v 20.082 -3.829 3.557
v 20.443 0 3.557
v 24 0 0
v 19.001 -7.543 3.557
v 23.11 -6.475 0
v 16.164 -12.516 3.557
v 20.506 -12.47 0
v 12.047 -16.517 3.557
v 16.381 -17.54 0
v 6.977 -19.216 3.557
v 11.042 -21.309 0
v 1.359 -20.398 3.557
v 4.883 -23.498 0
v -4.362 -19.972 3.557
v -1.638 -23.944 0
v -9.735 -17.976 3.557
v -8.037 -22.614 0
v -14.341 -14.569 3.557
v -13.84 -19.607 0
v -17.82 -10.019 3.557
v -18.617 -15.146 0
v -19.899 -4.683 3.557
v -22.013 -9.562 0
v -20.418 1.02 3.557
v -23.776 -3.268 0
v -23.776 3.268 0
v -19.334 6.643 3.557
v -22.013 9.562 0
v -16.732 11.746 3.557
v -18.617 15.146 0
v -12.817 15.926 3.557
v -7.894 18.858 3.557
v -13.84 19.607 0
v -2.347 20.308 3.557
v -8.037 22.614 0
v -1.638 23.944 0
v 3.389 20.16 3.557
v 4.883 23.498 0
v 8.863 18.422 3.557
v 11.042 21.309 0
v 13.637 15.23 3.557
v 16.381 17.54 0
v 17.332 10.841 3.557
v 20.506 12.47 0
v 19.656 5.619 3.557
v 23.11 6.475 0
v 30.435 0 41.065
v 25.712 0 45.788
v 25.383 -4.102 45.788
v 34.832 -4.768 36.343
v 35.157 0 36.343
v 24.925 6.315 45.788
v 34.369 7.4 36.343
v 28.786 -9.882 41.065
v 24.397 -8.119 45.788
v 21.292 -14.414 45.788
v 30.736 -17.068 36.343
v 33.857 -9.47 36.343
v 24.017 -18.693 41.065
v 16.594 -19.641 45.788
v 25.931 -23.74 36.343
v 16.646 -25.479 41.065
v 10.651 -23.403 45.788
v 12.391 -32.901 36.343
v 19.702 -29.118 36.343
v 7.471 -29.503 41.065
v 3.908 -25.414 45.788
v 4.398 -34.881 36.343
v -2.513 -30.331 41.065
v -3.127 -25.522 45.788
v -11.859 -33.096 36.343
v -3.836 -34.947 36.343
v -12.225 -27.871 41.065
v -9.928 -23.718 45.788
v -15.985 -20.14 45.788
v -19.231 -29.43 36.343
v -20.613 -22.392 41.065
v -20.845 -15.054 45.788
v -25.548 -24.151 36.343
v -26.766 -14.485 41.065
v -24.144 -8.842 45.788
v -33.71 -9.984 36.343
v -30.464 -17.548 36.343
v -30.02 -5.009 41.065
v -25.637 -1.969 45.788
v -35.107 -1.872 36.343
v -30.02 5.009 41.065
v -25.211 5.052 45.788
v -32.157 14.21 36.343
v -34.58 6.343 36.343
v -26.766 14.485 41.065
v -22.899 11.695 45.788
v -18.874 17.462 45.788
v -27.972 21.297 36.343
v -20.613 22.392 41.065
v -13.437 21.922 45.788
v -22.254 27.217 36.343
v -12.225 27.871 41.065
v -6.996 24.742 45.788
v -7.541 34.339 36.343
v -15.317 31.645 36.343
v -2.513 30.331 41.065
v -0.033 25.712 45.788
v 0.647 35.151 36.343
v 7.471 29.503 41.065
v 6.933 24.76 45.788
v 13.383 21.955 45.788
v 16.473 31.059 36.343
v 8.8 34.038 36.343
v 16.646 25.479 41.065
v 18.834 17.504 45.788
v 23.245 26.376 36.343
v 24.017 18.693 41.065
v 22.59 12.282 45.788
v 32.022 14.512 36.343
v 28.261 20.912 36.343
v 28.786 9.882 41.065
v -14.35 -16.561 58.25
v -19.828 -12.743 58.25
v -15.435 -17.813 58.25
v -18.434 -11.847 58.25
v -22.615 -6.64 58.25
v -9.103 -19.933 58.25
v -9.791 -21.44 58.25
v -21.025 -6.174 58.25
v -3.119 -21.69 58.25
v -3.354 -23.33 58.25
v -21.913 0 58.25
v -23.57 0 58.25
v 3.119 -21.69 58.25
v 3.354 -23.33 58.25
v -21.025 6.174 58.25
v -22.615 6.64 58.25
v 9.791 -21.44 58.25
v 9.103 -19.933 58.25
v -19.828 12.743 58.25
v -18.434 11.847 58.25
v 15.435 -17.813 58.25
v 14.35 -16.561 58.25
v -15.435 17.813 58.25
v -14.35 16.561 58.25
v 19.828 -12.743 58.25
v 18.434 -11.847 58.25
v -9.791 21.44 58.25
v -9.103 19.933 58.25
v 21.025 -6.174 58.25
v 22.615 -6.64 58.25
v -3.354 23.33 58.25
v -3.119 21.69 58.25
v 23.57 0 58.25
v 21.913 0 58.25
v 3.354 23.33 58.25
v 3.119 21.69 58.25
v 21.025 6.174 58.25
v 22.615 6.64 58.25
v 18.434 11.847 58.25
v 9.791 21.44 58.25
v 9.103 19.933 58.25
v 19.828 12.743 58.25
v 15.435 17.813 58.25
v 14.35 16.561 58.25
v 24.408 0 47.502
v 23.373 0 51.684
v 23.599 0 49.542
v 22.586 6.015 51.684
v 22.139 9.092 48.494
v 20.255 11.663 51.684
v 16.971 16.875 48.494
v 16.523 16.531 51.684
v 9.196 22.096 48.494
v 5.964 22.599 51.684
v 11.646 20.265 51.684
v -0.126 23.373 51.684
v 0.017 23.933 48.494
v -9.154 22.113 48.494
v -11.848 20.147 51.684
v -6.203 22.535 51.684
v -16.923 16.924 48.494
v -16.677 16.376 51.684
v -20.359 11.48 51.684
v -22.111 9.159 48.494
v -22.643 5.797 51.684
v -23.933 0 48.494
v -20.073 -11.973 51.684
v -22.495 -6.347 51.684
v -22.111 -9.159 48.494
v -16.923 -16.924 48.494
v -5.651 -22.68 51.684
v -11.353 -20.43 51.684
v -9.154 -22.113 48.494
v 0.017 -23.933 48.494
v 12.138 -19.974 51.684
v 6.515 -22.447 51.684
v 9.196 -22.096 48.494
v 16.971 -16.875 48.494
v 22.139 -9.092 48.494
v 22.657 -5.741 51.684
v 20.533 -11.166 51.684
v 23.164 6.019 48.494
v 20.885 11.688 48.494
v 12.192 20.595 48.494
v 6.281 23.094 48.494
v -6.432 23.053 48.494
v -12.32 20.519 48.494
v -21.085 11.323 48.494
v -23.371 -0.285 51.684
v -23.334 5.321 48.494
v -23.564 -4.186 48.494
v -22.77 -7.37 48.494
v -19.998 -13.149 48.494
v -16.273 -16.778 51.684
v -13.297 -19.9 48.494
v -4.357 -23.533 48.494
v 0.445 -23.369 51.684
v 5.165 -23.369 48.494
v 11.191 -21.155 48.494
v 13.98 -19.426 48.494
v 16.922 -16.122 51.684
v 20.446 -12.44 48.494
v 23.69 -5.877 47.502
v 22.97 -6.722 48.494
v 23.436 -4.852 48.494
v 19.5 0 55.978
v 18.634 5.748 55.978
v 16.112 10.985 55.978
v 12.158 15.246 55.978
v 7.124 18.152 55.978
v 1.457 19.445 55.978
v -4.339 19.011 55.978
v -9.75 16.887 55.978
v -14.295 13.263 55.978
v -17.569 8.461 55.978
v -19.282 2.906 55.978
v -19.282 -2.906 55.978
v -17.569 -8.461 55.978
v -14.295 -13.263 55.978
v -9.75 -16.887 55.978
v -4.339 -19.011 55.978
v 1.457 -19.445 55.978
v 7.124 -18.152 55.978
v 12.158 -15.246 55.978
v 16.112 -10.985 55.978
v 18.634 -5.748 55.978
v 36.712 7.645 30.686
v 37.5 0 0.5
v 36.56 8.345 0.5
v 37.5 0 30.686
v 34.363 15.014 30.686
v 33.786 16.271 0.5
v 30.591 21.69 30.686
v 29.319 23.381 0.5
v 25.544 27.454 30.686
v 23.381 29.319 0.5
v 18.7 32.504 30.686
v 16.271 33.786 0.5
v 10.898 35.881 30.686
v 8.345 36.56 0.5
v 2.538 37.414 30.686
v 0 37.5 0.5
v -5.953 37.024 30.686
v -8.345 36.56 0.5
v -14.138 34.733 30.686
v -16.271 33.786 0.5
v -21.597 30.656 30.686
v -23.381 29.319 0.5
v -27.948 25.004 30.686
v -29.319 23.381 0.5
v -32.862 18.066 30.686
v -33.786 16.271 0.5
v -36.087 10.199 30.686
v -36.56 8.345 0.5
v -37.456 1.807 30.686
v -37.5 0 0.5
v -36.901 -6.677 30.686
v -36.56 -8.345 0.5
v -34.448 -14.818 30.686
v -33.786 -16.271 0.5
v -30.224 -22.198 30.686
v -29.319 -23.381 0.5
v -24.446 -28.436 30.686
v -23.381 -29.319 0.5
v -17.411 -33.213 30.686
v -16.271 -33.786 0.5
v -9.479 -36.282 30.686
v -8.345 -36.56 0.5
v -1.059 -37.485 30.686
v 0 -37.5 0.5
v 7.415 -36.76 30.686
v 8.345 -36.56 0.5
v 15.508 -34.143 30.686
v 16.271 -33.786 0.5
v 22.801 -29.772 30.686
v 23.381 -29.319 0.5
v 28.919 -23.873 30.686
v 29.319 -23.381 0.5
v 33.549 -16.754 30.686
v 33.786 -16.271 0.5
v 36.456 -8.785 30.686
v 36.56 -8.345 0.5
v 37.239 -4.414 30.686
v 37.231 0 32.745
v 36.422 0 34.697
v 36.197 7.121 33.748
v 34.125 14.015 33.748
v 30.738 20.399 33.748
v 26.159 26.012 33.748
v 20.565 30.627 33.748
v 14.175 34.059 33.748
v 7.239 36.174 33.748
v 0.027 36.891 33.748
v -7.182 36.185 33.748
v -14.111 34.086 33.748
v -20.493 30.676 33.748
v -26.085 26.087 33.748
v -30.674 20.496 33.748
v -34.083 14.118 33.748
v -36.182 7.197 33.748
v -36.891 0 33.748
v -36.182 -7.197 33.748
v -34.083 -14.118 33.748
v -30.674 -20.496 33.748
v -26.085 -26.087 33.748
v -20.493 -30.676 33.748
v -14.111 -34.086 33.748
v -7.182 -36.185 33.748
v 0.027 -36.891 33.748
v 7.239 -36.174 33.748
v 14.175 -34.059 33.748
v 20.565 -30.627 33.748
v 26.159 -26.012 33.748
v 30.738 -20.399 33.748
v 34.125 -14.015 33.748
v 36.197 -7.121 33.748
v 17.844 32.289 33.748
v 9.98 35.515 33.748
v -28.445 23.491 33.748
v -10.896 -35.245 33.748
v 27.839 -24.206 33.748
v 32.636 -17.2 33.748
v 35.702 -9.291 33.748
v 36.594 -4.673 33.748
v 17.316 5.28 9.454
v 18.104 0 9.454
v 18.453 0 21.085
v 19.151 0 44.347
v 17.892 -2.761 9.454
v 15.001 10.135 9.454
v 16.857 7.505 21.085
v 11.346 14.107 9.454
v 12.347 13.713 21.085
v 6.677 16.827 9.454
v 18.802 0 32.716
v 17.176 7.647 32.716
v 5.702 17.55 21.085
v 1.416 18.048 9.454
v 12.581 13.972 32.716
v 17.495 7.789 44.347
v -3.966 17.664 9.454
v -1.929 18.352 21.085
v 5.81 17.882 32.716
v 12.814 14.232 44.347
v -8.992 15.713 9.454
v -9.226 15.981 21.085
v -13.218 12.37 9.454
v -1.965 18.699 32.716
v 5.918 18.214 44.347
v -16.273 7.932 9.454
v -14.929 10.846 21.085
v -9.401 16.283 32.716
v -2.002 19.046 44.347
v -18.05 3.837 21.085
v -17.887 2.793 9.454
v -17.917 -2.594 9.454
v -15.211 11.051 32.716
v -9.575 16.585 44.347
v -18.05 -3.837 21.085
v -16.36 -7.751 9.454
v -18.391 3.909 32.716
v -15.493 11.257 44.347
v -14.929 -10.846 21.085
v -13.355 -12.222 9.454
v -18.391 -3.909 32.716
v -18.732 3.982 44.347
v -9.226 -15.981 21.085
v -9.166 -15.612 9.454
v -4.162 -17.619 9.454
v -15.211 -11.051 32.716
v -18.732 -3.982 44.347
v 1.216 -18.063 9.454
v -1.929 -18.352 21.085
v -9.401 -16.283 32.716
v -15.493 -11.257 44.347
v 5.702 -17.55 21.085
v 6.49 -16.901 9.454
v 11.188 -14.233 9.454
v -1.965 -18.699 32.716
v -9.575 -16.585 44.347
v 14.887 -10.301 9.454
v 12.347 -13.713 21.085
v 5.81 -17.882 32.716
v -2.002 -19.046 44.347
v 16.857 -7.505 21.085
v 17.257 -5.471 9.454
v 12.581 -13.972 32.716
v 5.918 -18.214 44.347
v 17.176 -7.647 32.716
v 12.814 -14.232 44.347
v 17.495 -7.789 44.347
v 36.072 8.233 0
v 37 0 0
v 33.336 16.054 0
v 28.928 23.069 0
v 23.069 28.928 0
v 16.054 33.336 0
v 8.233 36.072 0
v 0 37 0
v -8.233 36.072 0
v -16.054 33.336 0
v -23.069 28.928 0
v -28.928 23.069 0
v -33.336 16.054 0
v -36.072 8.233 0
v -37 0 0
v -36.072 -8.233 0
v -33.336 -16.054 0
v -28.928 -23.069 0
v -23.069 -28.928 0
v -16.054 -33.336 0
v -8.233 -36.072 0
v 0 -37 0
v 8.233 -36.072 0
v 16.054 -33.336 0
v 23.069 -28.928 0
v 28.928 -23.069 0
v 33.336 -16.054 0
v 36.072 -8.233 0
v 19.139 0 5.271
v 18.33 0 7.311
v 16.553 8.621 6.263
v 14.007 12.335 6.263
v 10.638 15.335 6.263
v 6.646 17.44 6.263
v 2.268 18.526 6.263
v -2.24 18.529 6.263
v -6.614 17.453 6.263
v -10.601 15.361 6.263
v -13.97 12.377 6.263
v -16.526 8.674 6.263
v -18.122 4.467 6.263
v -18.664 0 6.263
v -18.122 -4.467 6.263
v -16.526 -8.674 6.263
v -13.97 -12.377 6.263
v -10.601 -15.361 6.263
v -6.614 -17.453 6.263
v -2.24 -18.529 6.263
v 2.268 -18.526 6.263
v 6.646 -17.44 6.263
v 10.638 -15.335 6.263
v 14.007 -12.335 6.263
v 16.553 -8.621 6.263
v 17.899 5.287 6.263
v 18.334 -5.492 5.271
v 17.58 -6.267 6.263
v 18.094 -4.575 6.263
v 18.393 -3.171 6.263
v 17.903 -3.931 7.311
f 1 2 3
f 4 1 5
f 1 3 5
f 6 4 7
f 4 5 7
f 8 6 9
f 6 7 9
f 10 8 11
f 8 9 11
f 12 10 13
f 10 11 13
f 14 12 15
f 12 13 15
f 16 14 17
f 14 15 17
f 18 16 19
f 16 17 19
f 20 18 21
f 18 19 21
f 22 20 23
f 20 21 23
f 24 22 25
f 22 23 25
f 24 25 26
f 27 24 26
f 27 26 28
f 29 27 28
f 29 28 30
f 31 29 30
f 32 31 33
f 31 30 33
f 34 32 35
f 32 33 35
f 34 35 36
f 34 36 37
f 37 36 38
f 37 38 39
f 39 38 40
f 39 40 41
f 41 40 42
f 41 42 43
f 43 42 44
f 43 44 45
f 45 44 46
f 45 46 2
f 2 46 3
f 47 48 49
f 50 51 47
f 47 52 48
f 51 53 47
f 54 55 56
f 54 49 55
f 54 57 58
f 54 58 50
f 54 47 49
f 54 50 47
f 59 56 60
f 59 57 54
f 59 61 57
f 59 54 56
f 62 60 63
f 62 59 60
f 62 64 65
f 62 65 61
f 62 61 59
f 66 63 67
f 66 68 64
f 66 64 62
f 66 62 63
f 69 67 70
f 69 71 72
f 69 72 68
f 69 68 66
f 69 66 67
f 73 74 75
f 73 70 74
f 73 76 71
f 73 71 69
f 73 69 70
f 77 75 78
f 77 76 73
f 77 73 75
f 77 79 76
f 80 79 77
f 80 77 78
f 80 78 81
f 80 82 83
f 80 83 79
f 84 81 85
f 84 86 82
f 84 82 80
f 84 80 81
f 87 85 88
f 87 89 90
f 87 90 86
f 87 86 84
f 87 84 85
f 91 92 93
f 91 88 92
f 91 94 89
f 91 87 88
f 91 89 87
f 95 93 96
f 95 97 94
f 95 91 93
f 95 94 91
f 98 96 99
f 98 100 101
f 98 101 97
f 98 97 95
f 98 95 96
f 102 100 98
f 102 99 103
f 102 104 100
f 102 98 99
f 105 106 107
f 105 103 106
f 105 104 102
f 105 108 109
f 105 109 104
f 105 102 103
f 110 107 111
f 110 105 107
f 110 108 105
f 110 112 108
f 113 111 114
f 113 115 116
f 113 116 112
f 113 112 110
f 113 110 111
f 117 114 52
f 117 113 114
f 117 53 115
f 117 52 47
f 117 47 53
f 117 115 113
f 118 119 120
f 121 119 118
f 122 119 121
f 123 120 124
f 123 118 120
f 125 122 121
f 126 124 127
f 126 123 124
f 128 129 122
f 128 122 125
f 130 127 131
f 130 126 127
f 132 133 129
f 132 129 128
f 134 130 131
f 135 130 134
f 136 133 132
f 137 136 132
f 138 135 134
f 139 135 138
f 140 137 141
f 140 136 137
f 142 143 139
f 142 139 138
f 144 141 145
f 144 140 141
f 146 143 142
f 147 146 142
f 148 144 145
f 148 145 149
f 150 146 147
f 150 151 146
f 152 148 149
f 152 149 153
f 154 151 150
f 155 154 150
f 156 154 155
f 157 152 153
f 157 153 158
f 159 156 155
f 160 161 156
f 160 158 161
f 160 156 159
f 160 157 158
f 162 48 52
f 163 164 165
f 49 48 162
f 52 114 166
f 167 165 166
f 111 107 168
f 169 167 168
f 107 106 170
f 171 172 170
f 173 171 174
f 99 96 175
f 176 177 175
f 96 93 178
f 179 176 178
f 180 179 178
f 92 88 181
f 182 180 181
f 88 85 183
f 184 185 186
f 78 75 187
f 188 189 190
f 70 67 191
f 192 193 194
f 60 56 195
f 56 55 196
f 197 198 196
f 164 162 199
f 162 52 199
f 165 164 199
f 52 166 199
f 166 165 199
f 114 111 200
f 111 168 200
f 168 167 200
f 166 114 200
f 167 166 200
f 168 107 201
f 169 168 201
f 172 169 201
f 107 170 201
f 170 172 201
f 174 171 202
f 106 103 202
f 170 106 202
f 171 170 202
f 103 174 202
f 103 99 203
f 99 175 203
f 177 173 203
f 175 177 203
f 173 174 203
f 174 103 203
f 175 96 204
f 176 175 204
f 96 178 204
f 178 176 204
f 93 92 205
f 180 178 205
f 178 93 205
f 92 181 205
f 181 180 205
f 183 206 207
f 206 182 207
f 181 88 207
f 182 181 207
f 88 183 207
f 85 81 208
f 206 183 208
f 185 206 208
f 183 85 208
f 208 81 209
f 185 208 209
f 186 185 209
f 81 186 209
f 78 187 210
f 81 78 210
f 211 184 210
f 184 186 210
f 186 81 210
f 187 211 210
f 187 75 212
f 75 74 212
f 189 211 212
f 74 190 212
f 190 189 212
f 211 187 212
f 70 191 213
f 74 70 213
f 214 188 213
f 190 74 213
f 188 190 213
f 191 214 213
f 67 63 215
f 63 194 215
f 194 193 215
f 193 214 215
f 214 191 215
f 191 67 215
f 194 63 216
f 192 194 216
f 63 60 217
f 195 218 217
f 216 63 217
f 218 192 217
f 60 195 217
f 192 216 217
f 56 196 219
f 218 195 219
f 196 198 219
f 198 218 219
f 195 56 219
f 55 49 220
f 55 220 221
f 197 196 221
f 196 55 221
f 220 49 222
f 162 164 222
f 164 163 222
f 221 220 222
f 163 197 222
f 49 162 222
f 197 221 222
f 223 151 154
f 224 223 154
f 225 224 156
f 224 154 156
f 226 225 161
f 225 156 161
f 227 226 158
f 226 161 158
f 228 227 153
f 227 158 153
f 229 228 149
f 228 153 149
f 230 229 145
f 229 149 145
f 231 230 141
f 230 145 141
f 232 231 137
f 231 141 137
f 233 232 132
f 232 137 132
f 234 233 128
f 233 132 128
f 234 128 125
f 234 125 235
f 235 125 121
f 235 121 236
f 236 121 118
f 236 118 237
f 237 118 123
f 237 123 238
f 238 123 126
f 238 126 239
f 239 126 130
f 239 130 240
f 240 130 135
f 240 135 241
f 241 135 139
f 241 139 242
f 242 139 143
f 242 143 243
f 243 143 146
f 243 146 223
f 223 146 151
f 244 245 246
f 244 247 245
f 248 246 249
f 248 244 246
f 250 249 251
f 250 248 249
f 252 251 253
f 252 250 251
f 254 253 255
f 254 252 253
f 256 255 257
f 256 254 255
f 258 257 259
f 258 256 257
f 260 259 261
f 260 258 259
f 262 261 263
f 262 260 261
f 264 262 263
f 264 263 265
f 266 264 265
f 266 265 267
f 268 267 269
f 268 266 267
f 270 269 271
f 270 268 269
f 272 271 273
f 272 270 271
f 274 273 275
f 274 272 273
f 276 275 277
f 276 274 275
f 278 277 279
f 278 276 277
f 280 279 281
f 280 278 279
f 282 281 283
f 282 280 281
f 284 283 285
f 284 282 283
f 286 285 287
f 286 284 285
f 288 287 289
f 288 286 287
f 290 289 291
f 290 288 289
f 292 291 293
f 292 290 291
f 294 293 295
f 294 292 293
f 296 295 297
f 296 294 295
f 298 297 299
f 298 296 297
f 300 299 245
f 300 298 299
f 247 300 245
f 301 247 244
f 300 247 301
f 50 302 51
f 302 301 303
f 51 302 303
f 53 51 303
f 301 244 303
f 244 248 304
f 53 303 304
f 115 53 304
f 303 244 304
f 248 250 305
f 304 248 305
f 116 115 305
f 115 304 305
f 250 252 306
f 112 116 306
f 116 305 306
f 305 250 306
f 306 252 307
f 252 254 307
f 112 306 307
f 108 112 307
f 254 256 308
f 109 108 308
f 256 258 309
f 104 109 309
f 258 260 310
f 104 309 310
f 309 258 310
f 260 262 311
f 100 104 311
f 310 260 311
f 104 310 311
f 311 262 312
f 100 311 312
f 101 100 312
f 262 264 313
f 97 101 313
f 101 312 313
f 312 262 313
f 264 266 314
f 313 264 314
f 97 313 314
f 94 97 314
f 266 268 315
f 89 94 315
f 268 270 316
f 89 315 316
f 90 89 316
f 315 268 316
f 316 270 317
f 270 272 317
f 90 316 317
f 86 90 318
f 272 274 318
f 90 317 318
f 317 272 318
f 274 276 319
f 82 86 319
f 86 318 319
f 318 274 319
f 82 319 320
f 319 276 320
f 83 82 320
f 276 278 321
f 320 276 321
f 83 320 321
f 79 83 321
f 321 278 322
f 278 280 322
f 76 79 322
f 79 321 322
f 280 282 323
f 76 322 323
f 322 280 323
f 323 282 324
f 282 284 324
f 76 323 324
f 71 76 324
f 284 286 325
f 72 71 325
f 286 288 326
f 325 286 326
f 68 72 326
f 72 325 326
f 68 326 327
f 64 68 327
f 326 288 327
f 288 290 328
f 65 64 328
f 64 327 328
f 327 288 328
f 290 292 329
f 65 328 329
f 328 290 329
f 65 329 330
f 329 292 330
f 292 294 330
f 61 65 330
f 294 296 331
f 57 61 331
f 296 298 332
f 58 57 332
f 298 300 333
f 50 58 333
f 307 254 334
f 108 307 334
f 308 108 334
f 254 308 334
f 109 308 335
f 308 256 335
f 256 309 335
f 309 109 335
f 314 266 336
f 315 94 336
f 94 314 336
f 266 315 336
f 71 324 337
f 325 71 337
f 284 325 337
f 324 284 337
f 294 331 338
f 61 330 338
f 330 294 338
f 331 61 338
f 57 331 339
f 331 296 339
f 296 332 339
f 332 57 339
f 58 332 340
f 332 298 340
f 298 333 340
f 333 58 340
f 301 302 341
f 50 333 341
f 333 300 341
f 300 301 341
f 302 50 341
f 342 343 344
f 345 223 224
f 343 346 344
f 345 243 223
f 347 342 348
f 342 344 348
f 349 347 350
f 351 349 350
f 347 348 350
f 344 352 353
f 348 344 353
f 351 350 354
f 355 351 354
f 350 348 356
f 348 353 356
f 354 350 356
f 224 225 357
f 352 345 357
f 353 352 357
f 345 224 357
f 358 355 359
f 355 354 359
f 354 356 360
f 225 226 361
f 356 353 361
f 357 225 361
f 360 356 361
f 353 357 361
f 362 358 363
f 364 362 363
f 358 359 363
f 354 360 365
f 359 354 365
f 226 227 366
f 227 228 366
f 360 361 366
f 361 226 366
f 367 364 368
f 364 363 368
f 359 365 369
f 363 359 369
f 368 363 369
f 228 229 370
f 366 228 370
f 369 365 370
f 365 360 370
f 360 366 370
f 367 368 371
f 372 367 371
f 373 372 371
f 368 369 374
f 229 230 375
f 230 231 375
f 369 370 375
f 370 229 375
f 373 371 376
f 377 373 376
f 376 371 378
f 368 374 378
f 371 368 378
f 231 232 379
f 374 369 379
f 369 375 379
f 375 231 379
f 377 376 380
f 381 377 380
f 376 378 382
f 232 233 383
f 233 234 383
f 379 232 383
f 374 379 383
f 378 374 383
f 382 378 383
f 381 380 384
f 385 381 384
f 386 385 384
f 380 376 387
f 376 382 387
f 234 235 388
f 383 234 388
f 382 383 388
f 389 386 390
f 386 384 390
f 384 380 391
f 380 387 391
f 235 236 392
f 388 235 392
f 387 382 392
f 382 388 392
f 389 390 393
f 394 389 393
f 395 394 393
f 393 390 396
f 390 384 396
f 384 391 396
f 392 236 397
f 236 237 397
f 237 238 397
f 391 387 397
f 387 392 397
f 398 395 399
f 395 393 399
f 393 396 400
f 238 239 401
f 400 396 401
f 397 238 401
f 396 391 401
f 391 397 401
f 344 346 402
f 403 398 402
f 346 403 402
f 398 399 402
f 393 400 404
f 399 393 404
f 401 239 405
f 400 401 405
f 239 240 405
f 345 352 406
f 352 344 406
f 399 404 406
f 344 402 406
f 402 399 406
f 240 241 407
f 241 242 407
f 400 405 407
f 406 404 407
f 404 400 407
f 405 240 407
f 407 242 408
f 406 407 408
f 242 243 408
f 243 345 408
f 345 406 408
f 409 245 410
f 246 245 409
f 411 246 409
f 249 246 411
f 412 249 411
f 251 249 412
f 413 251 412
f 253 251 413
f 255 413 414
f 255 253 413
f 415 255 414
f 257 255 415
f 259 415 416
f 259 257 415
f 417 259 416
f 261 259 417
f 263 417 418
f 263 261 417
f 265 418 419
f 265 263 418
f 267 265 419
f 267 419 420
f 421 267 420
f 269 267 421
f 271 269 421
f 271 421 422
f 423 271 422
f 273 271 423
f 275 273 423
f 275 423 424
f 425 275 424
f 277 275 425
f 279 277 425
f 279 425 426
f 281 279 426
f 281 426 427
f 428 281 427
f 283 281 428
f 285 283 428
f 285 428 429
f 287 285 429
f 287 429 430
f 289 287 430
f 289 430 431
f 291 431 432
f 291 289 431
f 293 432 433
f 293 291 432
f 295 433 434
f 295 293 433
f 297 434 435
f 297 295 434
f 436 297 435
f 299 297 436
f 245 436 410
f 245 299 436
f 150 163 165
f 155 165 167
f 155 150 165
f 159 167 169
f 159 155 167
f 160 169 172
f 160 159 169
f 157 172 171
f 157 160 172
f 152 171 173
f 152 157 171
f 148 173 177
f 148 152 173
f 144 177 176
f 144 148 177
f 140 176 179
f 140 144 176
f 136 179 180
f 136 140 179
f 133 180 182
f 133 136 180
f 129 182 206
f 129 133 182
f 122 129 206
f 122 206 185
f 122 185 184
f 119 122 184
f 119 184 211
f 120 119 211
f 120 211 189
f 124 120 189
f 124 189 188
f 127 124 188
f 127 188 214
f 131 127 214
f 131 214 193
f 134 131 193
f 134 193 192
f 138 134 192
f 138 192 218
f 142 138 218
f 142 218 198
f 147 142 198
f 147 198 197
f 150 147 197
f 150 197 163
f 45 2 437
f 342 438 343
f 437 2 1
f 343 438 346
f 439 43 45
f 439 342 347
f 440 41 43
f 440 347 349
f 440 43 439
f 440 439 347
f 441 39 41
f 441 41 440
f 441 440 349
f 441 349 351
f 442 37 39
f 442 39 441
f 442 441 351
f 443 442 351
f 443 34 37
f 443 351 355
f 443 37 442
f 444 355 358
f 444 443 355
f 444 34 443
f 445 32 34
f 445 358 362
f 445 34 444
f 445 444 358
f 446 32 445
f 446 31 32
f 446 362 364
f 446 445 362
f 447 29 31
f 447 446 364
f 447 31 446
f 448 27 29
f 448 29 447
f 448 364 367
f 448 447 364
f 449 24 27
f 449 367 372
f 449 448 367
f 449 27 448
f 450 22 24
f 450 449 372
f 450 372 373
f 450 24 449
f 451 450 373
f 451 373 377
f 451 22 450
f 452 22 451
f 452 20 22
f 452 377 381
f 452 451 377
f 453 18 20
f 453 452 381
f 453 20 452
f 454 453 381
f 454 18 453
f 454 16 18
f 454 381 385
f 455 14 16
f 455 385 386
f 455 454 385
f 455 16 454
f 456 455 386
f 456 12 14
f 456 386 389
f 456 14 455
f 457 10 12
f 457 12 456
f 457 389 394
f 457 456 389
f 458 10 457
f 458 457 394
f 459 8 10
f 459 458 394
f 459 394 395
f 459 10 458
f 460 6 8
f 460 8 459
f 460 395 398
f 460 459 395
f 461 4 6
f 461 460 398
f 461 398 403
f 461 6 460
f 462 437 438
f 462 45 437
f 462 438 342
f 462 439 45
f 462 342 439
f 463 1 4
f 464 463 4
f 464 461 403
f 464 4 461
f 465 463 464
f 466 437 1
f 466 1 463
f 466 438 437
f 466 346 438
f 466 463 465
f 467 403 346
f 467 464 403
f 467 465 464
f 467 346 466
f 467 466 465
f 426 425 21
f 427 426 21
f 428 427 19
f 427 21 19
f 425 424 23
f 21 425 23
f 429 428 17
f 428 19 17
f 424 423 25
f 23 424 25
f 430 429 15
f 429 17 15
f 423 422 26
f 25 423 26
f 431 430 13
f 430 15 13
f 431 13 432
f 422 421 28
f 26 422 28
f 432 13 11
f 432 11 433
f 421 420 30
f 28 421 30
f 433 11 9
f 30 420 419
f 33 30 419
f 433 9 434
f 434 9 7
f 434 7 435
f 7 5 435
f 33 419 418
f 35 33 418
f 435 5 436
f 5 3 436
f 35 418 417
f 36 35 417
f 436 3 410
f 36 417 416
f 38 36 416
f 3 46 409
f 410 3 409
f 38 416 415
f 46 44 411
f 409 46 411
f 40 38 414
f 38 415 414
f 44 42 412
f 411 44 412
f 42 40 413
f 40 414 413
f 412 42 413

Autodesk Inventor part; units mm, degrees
ref_plane "YZ Plane" through (0, 0, 0) normal (1, 0, 0) x (0, 1, 0)
ref_plane "XZ Plane" through (0, 0, 0) normal (0, 1, 0) x (-1, 0, 0)
sketch "Sketch2" plane through (0, 0, 0) normal (0, 1, 0) x (-1, 0, 0)
  line L0 (-45, 0) -> (7.5, 0) projected
  line L1 (0, -11.9711) -> (0, 71.8268) projected
  line L2 (-37.5, 0) -> (-37.5, 34)
  line L3 (-23.2693, 48.2307) -> (-23.6182, 59.8557)
  line L4 (-19.5, 55.9775) -> (-18, 6)
  line L5 (-19.5, 55.9775) -> (-23.6182, 59.8557)
  line L6 (-33.5, 0) -> (-37.5, 0)
  line L7 (-37.5, 34) -> (-23.2693, 48.2307)
  line L8 (-18, 6) -> (-24, 0)
  line L9 (-33.5, 0) -> (-24, 0)
  point P0 (0, 0)
  dimension "d4" = 4
  dimension "d7" = 34
  dimension "d8" = 37.5
  dimension "d9" = 18
  dimension "d10" = 50
  dimension "d11" = 135
  dimension "d15" = 19.5
  dimension "d25" = 24
  dimension "d26" = 45
  dimension "d27" = 135
revolve "Revolution1" add sketch "Sketch2" angle 360 about axis through (0, 0, -10) along (0, 0, 1)
fillet "Fillet1" radius 8 2 edges at (-23.2693, 0, 48.2307) (-37.5, 0, 34)
ref_plane "Work Plane1" through (0, 0, 60.25) normal (0, 0, 1) x (1, 0, 0)
sketch "Sketch3" plane through (0, 0, 60.25) normal (0, 0, 1) x (1, 0, 0)
  circle A0 centre (0, 0) radius 31.1812
extrude "Extrusion2" cut sketch "Sketch3" against normal blind 2
chamfer "Chamfer1" distance 0.5 angle 45 1 edges at (-37.5, 0, 0)
fillet "Fillet2" radius 8 1 edges at (-18, 0, 6)
properties part number "_3DPrint"
